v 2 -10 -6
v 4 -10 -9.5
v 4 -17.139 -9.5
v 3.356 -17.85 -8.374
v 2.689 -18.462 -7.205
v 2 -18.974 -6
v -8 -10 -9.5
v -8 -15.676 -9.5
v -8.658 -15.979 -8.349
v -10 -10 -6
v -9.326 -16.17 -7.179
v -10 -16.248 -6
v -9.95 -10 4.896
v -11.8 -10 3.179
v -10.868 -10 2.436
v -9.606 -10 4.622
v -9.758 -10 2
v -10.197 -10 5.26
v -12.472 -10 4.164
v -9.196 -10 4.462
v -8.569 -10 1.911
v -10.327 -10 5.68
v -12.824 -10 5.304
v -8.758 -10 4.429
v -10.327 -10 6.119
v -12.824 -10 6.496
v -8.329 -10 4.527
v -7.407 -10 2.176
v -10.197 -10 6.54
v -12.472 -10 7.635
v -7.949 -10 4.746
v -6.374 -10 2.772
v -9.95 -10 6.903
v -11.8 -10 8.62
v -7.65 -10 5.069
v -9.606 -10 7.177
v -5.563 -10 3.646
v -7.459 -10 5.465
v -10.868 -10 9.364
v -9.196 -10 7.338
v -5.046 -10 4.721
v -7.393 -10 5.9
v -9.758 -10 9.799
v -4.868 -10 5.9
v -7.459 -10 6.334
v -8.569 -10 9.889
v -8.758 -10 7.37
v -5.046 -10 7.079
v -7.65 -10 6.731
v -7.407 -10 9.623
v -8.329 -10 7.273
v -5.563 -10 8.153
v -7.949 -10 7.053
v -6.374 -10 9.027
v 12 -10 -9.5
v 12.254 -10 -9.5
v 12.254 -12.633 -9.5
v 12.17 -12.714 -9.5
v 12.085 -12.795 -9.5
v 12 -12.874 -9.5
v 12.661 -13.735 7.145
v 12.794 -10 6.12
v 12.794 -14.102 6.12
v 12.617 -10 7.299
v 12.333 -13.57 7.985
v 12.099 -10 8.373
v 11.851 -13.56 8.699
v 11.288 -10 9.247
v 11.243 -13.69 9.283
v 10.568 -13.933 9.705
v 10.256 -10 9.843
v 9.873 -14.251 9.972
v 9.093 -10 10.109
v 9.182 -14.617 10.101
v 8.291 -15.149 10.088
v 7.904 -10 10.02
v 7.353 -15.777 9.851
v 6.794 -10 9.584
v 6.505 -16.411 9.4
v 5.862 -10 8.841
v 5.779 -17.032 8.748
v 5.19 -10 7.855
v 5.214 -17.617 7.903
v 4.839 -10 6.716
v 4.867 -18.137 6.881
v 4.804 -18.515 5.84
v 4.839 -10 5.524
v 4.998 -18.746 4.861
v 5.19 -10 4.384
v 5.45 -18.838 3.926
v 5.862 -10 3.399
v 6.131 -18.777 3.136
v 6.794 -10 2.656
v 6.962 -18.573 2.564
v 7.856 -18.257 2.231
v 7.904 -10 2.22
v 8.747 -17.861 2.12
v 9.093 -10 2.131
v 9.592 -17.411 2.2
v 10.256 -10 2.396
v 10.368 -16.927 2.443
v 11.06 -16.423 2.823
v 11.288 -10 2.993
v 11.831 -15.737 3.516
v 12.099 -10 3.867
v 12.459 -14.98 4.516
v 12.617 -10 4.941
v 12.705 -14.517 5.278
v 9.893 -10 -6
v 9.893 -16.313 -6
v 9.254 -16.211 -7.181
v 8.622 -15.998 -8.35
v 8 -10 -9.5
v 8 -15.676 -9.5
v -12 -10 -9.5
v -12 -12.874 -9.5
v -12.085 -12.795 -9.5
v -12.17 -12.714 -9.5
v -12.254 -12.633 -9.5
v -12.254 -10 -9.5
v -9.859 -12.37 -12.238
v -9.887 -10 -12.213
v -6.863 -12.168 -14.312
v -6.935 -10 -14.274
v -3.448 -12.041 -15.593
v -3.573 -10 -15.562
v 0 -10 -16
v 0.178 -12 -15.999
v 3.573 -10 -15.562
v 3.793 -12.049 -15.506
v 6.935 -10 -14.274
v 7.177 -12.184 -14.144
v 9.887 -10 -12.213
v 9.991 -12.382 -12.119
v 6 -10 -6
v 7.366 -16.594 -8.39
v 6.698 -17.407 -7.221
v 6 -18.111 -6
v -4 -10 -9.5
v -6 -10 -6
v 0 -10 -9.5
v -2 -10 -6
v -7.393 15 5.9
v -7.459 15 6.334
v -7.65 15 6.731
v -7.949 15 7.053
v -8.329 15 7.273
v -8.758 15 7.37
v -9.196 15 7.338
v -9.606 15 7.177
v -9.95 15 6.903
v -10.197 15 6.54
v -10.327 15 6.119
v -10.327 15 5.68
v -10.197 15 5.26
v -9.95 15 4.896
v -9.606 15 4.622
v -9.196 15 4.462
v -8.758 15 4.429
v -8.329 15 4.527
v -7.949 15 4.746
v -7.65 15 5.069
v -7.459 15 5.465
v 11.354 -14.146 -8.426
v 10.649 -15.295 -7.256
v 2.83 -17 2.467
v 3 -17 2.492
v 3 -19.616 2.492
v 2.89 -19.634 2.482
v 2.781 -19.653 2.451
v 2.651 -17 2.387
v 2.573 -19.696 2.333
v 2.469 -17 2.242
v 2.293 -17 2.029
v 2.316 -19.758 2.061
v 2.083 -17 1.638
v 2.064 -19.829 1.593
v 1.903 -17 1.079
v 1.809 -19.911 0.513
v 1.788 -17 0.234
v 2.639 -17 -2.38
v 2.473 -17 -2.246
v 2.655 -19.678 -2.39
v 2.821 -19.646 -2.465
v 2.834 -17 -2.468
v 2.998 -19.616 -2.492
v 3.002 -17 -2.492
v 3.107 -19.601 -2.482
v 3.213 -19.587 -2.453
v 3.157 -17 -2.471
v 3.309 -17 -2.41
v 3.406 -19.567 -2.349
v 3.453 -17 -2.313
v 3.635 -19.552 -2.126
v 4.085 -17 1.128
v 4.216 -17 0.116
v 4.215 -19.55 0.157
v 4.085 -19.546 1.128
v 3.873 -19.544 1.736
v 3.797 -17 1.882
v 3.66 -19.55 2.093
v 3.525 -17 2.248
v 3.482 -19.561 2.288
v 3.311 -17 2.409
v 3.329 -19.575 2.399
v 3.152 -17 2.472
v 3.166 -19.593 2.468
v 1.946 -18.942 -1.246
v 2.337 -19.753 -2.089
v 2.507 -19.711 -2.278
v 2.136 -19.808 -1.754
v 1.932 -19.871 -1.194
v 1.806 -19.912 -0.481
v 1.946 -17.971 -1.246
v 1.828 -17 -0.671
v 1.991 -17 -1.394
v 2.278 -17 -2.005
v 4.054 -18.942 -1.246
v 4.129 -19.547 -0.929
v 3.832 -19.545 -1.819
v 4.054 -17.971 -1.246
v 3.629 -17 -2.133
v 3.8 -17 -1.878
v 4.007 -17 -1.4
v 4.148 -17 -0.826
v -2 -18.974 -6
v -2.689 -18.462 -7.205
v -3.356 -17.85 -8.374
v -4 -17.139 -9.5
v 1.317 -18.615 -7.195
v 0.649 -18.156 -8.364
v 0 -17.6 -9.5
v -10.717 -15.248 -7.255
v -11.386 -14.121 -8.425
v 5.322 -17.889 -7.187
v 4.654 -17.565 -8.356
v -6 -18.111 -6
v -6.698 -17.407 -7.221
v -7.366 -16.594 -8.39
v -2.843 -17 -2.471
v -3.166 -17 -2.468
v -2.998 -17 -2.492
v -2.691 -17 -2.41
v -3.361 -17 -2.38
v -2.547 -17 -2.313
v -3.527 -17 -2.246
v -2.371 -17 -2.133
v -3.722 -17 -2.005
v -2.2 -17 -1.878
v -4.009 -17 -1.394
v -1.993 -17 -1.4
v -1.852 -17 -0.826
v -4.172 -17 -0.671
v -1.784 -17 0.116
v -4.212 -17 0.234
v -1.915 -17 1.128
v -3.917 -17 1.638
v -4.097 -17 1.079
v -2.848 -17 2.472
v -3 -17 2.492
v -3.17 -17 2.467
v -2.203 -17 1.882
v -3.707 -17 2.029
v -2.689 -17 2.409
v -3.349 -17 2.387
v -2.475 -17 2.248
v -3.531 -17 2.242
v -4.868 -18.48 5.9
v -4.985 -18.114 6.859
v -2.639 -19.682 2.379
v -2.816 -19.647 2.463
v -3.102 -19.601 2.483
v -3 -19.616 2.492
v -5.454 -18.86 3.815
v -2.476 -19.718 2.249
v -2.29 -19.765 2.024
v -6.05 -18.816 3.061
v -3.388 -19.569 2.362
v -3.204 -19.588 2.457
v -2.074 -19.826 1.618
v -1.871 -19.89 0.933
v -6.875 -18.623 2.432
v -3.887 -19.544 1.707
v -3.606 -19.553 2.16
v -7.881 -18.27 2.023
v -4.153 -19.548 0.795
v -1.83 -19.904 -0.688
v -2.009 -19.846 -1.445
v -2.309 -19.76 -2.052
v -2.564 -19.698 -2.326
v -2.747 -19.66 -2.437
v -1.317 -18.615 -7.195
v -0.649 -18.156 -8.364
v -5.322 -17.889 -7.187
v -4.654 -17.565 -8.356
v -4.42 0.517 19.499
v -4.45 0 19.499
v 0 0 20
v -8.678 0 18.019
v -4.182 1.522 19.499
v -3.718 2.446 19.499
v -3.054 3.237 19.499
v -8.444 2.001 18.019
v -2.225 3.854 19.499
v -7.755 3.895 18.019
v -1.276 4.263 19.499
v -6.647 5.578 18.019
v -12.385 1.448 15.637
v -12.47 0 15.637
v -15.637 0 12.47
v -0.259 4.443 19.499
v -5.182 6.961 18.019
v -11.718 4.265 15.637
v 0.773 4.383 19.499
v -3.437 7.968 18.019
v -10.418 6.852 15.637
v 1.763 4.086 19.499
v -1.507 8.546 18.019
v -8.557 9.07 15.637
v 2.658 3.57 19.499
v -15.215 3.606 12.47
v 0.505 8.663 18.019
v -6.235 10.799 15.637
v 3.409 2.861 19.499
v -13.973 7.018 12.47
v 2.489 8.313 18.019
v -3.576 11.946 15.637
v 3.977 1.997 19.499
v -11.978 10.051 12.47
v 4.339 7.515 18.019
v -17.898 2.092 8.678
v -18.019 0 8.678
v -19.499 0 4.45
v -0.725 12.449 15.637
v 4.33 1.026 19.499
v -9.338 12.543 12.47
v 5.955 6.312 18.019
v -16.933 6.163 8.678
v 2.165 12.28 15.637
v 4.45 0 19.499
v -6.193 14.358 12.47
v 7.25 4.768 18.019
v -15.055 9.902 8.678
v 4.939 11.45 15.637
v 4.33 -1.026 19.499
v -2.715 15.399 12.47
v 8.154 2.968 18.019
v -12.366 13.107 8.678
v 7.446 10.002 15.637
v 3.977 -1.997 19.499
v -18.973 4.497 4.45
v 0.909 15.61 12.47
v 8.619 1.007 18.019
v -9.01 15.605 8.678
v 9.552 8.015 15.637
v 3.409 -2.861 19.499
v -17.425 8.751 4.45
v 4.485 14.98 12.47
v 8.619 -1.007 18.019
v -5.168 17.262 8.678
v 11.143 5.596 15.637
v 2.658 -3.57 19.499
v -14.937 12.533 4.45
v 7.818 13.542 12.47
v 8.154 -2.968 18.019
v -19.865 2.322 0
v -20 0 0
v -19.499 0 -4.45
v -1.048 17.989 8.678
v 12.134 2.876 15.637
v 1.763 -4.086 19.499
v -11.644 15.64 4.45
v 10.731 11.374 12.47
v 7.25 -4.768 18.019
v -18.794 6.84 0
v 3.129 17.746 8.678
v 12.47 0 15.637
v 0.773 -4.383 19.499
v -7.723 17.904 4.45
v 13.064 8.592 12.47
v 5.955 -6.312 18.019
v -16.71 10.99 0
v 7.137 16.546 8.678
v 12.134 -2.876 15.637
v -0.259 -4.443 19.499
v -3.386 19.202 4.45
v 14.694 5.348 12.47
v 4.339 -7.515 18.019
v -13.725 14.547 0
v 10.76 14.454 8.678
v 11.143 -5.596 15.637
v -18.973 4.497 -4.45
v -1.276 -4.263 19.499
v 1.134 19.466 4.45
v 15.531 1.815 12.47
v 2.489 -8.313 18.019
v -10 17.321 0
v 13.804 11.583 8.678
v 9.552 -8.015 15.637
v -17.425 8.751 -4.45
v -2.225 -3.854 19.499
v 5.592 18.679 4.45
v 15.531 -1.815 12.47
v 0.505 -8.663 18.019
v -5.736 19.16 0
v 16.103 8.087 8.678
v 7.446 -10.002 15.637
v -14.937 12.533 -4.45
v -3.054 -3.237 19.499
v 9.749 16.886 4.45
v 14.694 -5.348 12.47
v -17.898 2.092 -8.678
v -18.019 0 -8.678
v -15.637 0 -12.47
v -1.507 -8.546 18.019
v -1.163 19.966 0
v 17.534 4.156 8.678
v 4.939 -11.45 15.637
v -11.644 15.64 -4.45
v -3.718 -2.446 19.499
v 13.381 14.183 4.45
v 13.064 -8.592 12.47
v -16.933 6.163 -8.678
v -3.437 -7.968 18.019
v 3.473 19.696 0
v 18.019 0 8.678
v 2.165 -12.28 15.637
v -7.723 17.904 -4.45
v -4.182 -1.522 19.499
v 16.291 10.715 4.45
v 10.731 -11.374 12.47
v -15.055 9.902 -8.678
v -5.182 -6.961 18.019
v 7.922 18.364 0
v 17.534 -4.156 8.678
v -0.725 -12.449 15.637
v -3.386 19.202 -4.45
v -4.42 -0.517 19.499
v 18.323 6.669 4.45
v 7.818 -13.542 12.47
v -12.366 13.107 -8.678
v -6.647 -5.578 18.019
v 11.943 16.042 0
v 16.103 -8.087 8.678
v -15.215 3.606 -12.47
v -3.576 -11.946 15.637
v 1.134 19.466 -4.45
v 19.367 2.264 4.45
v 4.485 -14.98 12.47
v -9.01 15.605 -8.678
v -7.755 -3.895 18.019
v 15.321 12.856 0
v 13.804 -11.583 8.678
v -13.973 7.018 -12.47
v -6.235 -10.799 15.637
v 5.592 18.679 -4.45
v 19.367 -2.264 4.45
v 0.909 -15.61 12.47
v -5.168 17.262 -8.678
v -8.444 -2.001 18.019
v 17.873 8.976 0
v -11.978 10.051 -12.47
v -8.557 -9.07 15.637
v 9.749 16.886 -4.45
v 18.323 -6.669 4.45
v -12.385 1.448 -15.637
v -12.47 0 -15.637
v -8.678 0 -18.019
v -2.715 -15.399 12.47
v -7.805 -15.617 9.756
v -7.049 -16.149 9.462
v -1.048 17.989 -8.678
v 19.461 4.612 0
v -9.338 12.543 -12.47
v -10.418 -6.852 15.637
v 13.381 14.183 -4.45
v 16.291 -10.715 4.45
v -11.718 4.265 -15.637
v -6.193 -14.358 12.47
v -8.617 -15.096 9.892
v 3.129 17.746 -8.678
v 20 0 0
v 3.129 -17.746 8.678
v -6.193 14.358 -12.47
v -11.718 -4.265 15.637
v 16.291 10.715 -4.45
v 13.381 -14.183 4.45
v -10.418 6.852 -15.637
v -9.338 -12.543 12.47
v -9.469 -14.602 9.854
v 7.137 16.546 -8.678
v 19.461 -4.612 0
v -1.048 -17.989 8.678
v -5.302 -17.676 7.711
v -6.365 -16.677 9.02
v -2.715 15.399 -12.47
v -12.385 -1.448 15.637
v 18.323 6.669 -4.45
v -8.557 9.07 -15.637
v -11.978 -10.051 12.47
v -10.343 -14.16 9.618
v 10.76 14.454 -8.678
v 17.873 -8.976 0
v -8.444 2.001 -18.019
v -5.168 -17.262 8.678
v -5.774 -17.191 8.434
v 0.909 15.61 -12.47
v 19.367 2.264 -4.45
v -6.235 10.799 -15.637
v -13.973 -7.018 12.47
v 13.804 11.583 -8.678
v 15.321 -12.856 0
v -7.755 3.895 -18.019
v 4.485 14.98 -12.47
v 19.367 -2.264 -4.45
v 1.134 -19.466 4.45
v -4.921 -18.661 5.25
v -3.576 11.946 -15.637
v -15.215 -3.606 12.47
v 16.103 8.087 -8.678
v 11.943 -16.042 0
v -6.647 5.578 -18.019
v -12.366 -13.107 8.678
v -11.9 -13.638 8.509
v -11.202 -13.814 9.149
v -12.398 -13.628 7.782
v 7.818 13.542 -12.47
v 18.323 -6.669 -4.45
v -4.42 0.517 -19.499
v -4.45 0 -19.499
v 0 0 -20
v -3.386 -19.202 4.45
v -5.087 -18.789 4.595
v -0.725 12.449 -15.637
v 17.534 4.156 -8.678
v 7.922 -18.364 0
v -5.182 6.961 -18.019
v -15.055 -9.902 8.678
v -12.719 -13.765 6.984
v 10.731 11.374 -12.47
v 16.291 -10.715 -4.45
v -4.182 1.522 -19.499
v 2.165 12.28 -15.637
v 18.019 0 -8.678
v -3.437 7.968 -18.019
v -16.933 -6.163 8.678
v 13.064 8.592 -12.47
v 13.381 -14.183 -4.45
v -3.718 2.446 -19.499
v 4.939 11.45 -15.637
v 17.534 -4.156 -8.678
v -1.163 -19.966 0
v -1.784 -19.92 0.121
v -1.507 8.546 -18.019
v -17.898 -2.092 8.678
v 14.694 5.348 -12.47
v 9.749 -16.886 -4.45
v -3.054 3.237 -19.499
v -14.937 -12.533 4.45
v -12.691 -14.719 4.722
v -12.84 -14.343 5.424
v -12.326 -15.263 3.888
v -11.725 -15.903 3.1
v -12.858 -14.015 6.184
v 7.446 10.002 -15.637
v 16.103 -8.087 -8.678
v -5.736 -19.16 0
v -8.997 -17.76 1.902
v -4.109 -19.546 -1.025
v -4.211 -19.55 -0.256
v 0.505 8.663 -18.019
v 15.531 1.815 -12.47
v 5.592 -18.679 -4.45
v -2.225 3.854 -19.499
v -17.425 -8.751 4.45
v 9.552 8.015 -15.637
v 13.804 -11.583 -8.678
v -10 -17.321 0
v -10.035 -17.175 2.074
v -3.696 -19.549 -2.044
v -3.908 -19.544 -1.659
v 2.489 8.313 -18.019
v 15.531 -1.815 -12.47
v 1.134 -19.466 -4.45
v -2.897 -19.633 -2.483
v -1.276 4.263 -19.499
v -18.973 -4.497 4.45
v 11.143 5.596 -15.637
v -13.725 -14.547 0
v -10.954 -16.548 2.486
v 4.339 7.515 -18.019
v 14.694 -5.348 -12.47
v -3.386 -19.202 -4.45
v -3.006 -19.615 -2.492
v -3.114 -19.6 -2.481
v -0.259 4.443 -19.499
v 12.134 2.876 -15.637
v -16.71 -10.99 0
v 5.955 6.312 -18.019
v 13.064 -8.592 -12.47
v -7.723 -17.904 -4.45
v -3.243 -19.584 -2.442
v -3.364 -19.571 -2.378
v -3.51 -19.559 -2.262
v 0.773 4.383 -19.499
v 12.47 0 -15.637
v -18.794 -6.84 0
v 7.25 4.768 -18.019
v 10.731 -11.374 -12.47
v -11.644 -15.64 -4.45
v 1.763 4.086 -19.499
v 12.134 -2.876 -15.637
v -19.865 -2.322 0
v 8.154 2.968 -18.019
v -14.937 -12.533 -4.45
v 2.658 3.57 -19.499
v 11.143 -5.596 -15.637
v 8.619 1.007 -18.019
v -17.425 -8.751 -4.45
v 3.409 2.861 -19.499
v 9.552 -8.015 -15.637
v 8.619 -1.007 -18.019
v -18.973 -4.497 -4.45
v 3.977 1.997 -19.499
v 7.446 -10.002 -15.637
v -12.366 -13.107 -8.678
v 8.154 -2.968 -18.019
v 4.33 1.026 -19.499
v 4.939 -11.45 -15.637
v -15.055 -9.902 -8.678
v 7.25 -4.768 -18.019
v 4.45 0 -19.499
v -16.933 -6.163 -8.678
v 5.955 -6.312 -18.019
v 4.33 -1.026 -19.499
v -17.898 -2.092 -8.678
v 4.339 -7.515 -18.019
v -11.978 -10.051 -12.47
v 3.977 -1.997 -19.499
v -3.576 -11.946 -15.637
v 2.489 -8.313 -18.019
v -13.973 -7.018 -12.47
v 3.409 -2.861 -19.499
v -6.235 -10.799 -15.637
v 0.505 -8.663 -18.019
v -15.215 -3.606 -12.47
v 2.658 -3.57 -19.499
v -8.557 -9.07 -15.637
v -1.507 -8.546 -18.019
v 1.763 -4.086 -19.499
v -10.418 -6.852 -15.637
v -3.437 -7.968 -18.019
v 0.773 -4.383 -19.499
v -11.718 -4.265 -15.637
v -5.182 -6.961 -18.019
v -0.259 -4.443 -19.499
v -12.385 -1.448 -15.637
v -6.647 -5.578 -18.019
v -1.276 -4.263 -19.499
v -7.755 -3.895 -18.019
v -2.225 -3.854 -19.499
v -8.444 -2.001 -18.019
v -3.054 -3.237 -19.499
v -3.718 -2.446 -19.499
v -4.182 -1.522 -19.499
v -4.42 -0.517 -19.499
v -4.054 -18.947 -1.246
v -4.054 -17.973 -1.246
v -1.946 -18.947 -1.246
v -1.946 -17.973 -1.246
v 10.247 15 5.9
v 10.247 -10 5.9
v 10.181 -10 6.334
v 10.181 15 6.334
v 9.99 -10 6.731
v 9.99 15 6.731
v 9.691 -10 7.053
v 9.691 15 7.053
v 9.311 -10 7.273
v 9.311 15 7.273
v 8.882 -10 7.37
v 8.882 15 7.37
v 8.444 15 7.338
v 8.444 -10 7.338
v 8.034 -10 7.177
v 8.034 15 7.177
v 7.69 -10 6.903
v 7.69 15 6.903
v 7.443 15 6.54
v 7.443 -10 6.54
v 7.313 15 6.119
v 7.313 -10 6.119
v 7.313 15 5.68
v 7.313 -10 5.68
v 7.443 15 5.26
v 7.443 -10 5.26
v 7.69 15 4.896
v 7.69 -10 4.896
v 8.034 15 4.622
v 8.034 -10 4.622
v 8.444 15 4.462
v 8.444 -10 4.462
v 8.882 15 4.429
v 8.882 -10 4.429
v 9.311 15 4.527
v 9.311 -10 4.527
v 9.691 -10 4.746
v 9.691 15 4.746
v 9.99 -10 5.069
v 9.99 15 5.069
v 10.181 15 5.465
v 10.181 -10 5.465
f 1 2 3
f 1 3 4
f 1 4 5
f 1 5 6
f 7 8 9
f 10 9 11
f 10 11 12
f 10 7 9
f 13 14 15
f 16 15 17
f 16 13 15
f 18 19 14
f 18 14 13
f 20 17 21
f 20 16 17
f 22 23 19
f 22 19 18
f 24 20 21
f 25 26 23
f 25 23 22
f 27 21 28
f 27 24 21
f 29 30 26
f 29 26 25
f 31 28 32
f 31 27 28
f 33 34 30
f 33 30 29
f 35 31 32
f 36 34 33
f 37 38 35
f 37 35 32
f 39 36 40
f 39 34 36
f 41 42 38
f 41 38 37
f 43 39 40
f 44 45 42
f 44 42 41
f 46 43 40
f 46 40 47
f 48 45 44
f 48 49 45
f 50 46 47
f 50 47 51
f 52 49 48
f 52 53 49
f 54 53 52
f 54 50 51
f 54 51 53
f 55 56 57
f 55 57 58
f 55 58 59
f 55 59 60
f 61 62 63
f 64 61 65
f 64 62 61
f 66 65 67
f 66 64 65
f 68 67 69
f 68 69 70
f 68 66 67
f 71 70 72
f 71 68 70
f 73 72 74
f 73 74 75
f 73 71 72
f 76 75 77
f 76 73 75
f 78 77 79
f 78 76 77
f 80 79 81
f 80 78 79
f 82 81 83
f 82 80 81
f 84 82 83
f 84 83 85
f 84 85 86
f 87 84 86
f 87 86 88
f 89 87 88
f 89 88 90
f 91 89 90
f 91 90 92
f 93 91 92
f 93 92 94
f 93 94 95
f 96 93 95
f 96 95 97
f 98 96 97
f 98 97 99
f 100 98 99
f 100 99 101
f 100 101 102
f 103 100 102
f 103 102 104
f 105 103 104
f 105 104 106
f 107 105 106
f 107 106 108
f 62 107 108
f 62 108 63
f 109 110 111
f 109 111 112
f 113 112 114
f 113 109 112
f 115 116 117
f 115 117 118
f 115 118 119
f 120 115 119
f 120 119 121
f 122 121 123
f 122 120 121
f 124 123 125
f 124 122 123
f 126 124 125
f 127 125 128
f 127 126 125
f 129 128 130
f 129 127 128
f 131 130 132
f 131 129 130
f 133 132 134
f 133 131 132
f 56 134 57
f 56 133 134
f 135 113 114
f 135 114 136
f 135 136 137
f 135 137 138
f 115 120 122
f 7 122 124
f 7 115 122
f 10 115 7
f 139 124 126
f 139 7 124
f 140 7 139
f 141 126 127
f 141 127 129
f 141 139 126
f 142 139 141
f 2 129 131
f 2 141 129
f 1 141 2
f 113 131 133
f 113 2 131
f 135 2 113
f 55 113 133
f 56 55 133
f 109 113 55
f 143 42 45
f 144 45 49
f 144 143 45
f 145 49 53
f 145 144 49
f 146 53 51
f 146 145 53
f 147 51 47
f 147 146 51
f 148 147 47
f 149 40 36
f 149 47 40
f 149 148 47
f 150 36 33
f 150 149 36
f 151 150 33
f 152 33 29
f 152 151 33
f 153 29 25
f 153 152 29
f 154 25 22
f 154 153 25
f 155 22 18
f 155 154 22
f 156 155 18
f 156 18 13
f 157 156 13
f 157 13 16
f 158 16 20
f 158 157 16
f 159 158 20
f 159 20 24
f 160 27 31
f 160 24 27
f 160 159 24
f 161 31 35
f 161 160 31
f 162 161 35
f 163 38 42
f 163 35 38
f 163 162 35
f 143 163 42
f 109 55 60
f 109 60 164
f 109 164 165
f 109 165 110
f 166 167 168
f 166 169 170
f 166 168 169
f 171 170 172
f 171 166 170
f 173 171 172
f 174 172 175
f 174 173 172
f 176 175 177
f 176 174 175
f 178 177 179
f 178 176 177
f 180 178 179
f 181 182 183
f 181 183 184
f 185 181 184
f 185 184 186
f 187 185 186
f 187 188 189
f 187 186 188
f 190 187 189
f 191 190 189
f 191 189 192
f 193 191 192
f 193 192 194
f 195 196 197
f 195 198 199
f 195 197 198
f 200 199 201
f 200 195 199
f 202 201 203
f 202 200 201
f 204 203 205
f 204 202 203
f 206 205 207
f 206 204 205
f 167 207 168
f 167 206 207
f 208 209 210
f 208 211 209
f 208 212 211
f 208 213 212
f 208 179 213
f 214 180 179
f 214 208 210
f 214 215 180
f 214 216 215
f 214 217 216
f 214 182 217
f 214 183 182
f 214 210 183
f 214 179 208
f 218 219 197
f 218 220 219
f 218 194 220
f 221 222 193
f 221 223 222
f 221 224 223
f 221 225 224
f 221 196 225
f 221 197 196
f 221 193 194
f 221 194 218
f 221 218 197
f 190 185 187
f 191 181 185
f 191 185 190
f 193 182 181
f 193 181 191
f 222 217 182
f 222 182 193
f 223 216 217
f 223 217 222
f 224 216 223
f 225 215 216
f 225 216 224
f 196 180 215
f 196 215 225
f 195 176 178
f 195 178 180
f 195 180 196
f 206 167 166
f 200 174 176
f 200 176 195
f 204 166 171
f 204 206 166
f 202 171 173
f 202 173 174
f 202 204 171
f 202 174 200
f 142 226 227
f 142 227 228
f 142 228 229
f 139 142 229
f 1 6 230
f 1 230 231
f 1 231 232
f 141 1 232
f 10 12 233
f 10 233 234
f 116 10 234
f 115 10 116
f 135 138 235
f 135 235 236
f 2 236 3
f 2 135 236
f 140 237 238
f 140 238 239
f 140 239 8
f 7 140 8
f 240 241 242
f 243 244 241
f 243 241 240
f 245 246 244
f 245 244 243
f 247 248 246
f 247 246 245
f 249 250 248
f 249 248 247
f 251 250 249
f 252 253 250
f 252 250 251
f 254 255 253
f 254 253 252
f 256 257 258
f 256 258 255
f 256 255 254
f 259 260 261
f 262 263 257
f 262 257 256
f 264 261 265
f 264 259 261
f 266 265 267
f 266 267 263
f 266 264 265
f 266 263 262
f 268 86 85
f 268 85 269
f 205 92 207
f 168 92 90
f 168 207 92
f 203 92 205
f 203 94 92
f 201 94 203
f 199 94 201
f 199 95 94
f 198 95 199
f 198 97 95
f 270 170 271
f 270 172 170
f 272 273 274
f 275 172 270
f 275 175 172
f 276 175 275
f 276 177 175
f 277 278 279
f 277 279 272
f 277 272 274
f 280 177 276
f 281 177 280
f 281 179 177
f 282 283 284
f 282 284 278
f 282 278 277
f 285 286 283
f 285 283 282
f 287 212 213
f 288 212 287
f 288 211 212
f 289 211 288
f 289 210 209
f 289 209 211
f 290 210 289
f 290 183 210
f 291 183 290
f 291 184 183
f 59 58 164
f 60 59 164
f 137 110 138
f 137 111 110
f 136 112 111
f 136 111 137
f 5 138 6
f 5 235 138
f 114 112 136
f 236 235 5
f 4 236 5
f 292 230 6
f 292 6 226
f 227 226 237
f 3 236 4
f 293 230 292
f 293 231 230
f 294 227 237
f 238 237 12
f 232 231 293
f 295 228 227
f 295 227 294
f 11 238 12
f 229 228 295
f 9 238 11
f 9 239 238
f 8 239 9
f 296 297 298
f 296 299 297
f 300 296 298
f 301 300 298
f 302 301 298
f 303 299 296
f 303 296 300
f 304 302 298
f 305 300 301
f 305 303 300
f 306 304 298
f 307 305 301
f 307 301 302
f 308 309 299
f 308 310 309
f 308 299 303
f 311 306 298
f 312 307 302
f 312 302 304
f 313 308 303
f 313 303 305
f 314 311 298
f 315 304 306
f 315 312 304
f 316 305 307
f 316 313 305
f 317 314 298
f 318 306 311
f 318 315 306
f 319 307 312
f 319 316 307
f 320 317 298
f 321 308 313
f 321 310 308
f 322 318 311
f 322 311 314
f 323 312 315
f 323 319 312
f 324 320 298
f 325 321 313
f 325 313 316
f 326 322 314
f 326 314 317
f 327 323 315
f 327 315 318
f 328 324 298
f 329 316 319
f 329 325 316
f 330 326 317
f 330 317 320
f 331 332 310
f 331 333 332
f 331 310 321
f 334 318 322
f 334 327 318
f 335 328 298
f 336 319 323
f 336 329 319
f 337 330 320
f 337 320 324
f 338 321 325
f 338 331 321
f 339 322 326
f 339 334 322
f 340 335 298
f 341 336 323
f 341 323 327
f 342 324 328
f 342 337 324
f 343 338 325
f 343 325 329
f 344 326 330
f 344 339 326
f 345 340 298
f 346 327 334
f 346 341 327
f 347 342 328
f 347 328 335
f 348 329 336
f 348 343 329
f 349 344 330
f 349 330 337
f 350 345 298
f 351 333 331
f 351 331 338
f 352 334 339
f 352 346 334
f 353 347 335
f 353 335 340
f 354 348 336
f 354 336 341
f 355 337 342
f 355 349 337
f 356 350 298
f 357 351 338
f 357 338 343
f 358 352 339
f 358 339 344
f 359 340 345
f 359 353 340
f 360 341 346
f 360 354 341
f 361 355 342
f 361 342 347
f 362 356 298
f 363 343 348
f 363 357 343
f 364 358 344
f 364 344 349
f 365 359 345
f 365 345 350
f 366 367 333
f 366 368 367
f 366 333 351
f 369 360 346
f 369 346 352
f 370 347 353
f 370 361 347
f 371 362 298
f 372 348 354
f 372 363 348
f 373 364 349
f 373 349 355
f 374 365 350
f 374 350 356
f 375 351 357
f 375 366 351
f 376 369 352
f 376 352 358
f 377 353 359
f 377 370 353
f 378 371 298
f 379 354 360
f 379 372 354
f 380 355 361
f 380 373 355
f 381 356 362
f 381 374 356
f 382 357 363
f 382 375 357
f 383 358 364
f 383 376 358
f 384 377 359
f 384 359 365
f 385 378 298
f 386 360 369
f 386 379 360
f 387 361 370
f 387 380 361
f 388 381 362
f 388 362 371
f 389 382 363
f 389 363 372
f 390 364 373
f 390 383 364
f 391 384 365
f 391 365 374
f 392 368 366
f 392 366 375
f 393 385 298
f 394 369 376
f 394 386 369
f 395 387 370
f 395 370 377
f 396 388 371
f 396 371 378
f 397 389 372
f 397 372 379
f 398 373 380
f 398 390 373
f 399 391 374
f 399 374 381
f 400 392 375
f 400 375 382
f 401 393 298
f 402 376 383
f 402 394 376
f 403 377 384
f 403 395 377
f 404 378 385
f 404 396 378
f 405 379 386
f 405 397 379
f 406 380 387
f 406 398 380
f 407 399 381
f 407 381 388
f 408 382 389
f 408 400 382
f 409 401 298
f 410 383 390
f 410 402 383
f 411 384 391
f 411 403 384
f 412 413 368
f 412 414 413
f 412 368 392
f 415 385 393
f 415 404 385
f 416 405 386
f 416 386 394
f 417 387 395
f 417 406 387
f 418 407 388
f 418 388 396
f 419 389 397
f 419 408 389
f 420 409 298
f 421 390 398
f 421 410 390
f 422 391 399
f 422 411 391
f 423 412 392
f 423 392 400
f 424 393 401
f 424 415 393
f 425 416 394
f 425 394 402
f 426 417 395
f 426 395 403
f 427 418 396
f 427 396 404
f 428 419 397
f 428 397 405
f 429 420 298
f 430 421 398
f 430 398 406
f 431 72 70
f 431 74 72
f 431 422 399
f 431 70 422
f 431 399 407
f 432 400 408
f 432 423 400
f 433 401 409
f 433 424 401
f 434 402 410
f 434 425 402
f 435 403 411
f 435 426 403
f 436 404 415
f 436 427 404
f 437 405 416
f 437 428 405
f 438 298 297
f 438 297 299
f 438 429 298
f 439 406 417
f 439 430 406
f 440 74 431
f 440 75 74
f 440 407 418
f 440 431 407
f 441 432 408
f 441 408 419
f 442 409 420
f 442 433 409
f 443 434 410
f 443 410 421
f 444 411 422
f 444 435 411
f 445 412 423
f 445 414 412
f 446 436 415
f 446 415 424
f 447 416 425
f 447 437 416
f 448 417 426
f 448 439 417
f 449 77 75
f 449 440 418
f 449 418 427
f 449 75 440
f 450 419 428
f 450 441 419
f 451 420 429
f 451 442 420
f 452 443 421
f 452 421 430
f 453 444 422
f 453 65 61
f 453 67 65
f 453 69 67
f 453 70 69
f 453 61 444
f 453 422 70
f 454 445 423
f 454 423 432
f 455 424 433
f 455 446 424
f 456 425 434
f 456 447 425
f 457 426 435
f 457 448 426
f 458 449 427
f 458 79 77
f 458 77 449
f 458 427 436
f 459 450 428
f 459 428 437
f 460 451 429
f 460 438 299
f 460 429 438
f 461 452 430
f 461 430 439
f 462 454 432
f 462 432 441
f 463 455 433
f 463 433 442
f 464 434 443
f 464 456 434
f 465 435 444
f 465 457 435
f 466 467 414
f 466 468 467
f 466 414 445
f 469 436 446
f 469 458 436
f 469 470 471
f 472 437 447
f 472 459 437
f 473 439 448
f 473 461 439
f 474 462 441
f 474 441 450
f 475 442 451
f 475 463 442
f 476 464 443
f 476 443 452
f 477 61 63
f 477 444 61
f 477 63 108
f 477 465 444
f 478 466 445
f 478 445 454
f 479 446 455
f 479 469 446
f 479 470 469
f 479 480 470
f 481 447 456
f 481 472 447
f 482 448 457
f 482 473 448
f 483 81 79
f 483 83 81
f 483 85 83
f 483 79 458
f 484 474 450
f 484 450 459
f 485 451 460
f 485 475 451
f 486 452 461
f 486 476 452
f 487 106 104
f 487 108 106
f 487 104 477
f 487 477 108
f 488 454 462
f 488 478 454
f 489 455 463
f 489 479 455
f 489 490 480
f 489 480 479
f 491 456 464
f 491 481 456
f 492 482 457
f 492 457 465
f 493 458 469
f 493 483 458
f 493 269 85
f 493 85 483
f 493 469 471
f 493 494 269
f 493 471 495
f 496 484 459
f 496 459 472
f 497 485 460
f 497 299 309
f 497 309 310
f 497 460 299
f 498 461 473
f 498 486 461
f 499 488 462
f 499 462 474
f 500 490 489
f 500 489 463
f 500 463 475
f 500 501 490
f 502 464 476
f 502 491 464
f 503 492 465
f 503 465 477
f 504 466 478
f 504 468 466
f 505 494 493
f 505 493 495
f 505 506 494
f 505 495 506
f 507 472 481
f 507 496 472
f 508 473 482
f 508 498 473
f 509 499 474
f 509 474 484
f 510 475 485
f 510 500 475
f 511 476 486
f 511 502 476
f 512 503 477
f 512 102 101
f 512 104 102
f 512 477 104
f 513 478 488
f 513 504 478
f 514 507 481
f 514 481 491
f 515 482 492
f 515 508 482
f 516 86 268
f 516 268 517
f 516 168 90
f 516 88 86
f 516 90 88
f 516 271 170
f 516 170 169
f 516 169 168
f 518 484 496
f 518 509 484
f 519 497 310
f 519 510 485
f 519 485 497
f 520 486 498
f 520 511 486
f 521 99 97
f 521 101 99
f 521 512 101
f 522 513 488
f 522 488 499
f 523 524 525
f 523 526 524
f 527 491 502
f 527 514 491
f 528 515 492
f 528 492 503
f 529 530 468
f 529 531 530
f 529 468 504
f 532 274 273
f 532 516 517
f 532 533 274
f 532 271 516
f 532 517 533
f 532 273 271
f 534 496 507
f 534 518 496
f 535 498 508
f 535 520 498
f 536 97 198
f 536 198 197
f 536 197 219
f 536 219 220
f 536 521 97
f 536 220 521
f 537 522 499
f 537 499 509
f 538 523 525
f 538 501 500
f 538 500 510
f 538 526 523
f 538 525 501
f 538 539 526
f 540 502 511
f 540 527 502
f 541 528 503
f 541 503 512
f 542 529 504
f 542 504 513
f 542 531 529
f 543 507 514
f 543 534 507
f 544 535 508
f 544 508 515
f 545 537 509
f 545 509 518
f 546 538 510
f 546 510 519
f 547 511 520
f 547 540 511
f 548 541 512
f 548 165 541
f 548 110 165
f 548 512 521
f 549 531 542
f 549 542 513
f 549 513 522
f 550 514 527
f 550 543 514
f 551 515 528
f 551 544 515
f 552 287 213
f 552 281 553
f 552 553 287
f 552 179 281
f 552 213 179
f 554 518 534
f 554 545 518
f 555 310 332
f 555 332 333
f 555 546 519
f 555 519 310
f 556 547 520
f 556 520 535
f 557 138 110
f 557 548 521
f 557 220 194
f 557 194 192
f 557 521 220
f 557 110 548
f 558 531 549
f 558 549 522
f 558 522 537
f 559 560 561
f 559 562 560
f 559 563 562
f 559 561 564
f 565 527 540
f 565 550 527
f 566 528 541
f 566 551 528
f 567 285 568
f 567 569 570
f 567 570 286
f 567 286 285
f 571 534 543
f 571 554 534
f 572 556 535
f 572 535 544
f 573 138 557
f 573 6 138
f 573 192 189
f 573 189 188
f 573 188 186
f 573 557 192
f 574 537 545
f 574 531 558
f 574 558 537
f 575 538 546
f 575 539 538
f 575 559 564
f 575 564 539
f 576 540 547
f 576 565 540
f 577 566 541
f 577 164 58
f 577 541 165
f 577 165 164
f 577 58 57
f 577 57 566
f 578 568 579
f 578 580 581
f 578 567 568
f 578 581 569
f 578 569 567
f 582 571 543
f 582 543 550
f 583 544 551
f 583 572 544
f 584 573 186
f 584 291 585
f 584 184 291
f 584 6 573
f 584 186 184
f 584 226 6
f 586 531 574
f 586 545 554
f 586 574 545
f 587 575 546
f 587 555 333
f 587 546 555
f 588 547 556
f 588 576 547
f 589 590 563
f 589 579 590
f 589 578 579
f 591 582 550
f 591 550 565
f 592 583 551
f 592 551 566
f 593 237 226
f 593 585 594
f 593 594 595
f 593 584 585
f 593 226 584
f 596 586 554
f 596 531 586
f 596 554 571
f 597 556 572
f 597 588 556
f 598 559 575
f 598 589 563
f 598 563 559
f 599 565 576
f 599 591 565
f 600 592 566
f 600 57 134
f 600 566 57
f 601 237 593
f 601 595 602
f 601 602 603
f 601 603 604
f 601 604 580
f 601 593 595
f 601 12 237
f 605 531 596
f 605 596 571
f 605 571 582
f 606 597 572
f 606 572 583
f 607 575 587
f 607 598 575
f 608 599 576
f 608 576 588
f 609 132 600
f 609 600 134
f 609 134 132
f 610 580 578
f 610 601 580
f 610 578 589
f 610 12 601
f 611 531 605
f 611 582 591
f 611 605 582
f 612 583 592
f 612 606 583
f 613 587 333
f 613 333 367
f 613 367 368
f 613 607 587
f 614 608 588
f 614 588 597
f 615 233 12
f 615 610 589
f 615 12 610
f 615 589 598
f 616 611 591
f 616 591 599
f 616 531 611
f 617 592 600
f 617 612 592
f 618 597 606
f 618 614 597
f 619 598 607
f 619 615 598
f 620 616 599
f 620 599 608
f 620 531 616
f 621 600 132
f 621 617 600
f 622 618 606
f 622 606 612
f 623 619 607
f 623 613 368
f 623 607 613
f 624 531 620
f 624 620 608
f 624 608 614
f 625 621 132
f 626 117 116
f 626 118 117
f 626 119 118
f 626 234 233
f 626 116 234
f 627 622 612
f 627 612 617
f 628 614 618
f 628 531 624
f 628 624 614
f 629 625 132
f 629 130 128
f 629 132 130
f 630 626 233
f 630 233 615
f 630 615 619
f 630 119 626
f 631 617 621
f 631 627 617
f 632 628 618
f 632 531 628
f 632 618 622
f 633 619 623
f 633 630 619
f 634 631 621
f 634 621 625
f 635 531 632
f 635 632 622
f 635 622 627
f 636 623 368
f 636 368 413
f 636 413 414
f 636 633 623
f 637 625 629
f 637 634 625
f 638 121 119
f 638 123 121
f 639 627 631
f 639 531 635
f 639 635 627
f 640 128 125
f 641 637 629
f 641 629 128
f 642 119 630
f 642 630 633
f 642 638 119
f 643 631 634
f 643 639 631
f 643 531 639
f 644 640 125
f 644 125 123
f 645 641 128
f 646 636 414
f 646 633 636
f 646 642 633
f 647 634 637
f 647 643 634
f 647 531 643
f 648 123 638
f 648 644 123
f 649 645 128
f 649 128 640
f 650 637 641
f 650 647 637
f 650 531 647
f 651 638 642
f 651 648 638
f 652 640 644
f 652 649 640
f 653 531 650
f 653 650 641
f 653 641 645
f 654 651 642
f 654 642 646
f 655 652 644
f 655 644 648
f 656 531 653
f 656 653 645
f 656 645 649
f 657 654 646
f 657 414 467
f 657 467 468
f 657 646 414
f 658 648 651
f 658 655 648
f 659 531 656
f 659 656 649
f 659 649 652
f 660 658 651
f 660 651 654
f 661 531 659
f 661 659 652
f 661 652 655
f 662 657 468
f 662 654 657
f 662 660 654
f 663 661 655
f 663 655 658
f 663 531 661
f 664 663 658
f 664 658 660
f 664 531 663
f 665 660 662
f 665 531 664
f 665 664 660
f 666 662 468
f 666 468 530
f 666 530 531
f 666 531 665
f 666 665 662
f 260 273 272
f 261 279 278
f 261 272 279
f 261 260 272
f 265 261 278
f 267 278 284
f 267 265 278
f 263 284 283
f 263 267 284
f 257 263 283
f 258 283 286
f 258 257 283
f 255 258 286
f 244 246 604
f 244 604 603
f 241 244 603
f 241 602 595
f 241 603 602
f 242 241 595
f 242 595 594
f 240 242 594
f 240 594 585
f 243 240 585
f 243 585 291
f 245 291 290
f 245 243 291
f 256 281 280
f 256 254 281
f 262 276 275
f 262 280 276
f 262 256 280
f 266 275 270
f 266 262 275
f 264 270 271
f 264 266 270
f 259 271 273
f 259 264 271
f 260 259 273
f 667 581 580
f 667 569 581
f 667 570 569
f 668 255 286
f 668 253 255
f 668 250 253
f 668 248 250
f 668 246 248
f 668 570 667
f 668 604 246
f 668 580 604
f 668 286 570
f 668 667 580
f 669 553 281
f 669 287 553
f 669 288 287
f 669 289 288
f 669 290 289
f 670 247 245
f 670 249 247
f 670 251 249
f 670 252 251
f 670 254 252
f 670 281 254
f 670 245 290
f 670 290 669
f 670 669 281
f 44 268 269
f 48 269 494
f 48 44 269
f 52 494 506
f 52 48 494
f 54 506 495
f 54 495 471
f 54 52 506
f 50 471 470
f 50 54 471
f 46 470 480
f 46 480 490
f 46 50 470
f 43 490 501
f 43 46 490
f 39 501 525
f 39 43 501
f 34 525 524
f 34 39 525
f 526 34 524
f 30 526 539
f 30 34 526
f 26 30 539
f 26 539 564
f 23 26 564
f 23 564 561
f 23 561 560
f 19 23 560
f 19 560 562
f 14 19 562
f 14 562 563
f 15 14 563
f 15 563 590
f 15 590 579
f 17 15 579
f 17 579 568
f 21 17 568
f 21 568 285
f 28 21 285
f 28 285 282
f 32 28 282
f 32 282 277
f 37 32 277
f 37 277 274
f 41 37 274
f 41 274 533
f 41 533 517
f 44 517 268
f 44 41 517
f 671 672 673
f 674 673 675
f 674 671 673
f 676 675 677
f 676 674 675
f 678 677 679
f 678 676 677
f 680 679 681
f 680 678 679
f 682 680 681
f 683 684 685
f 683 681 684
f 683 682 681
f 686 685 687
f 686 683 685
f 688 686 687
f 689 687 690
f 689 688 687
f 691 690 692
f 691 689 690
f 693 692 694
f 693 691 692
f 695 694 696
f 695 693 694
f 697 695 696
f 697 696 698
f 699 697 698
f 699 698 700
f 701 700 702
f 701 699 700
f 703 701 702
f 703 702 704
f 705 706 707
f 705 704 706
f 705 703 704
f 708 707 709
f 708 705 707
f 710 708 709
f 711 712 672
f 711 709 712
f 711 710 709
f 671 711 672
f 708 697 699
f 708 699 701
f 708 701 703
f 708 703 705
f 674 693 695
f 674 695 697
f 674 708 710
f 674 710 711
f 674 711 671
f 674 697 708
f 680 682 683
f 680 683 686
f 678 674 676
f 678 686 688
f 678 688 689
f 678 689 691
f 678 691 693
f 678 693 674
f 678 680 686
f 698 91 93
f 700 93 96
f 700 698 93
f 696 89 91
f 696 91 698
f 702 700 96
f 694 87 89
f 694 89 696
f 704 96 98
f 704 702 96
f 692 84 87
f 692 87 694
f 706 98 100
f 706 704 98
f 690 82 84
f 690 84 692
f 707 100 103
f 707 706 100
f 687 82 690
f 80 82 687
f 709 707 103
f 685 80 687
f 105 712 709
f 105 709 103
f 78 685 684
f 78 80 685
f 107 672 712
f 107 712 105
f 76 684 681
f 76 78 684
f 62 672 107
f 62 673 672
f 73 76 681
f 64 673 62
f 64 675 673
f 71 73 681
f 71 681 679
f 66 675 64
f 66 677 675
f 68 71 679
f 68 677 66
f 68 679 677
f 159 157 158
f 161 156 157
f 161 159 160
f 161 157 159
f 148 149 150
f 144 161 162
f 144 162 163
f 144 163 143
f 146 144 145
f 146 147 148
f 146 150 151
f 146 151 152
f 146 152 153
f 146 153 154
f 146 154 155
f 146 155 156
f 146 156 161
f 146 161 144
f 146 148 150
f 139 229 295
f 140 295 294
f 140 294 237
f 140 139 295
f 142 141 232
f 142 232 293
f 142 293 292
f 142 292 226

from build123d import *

# Parameters (mm, degrees)
F3_R      = 4
F4_DEPTH  = 10
F7_DEPTH  = 25
F9_DEPTH  = 25
F10_R     = 1.475
F11_DEPTH = 15
F12_DEPTH = 25


with BuildPart() as f1:
    # F0 (on Front) → F1 (revolve)
    with BuildSketch(Plane.XZ):
        with BuildLine():
            Line((0, 0), (0, 20))
            ThreePointArc((0, 20), (-20, 0), (0, -20))
            Line((0, -20), (0, 0))
        make_face()
    revolve(axis=Axis((0, 0, -10), (0, 0, -1)))

    # F3 (on offset) → F4 (cut)
    with BuildSketch(Plane.XZ.offset(10)):
        with Locations((-8.868288, 5.899725)):
            Circle(F3_R)
        with Locations((8.794304, 6.119836)):
            Circle(F3_R)
    extrude(amount=F4_DEPTH, mode=Mode.SUBTRACT)

    # F6 (on offset) → F7 (cut)
    with BuildSketch(Plane.XZ.offset(17)):
        with BuildLine():
            add(Edge.make_bspline(
                [(-3, 2.491697), (-5.107968, 2.491697), (-4.053984, -1.245848), (-3, -4.983393), (-1.946016, -1.245848), (-0.892032, 2.491697), (-3, 2.491697)],
                knots=[0, 0, 0, 2.094395, 2.094395, 4.18879, 4.18879, 6.283185, 6.283185, 6.283185], degree=2, weights=[1, 0.5, 1, 0.5, 1, 0.5, 1]))
        make_face()
        with BuildLine():
            add(Edge.make_bspline(
                [(3, 2.491697), (0.892032, 2.491697), (1.946016, -1.245848), (3, -4.983393), (4.053984, -1.245848), (5.107968, 2.491697), (3, 2.491697)],
                knots=[0, 0, 0, 2.094395, 2.094395, 4.18879, 4.18879, 6.283185, 6.283185, 6.283185], degree=2, weights=[1, 0.5, 1, 0.5, 1, 0.5, 1]))
        make_face()
    extrude(amount=F7_DEPTH, mode=Mode.SUBTRACT)

    # F8 (on offset) → F9 (cut)
    with BuildSketch(Plane.XZ.offset(10)):
        with BuildLine():
            Line((-12, -9.5), (-12.253571, -9.5))
            ThreePointArc((-12.253571, -9.5), (0, -16), (12.253571, -9.5))
            Line((12.253571, -9.5), (12, -9.5))
            Line((12, -9.5), (9.89303, -6))
            Line((9.89303, -6), (8, -9.5))
            Line((8, -9.5), (6, -6))
            Line((6, -6), (4, -9.5))
            Line((4, -9.5), (2, -6))
            Line((2, -6), (0, -9.5))
            Line((0, -9.5), (-2, -6))
            Line((-2, -6), (-4, -9.5))
            Line((-4, -9.5), (-6, -6))
            Line((-6, -6), (-8, -9.5))
            Line((-8, -9.5), (-10, -6))
            Line((-10, -6), (-12, -9.5))
        make_face()
    extrude(amount=F9_DEPTH, mode=Mode.SUBTRACT)

    # F10 (on Front) → F11 (cut)
    with BuildSketch(Plane.XZ):
        with Locations((-8.868279, 5.899623)):
            Circle(F10_R)
        with Locations((8.771721, 5.899623)):
            Circle(F10_R)
    extrude(amount=-F11_DEPTH, mode=Mode.SUBTRACT)

    # F10 (on Front) → F12 (cut)
    with BuildSketch(Plane.XZ):
        with Locations((-8.868279, 5.899623)):
            Circle(F10_R)
        with Locations((8.771721, 5.899623)):
            Circle(F10_R)
    extrude(amount=F12_DEPTH, mode=Mode.SUBTRACT)


solid = f1.part
